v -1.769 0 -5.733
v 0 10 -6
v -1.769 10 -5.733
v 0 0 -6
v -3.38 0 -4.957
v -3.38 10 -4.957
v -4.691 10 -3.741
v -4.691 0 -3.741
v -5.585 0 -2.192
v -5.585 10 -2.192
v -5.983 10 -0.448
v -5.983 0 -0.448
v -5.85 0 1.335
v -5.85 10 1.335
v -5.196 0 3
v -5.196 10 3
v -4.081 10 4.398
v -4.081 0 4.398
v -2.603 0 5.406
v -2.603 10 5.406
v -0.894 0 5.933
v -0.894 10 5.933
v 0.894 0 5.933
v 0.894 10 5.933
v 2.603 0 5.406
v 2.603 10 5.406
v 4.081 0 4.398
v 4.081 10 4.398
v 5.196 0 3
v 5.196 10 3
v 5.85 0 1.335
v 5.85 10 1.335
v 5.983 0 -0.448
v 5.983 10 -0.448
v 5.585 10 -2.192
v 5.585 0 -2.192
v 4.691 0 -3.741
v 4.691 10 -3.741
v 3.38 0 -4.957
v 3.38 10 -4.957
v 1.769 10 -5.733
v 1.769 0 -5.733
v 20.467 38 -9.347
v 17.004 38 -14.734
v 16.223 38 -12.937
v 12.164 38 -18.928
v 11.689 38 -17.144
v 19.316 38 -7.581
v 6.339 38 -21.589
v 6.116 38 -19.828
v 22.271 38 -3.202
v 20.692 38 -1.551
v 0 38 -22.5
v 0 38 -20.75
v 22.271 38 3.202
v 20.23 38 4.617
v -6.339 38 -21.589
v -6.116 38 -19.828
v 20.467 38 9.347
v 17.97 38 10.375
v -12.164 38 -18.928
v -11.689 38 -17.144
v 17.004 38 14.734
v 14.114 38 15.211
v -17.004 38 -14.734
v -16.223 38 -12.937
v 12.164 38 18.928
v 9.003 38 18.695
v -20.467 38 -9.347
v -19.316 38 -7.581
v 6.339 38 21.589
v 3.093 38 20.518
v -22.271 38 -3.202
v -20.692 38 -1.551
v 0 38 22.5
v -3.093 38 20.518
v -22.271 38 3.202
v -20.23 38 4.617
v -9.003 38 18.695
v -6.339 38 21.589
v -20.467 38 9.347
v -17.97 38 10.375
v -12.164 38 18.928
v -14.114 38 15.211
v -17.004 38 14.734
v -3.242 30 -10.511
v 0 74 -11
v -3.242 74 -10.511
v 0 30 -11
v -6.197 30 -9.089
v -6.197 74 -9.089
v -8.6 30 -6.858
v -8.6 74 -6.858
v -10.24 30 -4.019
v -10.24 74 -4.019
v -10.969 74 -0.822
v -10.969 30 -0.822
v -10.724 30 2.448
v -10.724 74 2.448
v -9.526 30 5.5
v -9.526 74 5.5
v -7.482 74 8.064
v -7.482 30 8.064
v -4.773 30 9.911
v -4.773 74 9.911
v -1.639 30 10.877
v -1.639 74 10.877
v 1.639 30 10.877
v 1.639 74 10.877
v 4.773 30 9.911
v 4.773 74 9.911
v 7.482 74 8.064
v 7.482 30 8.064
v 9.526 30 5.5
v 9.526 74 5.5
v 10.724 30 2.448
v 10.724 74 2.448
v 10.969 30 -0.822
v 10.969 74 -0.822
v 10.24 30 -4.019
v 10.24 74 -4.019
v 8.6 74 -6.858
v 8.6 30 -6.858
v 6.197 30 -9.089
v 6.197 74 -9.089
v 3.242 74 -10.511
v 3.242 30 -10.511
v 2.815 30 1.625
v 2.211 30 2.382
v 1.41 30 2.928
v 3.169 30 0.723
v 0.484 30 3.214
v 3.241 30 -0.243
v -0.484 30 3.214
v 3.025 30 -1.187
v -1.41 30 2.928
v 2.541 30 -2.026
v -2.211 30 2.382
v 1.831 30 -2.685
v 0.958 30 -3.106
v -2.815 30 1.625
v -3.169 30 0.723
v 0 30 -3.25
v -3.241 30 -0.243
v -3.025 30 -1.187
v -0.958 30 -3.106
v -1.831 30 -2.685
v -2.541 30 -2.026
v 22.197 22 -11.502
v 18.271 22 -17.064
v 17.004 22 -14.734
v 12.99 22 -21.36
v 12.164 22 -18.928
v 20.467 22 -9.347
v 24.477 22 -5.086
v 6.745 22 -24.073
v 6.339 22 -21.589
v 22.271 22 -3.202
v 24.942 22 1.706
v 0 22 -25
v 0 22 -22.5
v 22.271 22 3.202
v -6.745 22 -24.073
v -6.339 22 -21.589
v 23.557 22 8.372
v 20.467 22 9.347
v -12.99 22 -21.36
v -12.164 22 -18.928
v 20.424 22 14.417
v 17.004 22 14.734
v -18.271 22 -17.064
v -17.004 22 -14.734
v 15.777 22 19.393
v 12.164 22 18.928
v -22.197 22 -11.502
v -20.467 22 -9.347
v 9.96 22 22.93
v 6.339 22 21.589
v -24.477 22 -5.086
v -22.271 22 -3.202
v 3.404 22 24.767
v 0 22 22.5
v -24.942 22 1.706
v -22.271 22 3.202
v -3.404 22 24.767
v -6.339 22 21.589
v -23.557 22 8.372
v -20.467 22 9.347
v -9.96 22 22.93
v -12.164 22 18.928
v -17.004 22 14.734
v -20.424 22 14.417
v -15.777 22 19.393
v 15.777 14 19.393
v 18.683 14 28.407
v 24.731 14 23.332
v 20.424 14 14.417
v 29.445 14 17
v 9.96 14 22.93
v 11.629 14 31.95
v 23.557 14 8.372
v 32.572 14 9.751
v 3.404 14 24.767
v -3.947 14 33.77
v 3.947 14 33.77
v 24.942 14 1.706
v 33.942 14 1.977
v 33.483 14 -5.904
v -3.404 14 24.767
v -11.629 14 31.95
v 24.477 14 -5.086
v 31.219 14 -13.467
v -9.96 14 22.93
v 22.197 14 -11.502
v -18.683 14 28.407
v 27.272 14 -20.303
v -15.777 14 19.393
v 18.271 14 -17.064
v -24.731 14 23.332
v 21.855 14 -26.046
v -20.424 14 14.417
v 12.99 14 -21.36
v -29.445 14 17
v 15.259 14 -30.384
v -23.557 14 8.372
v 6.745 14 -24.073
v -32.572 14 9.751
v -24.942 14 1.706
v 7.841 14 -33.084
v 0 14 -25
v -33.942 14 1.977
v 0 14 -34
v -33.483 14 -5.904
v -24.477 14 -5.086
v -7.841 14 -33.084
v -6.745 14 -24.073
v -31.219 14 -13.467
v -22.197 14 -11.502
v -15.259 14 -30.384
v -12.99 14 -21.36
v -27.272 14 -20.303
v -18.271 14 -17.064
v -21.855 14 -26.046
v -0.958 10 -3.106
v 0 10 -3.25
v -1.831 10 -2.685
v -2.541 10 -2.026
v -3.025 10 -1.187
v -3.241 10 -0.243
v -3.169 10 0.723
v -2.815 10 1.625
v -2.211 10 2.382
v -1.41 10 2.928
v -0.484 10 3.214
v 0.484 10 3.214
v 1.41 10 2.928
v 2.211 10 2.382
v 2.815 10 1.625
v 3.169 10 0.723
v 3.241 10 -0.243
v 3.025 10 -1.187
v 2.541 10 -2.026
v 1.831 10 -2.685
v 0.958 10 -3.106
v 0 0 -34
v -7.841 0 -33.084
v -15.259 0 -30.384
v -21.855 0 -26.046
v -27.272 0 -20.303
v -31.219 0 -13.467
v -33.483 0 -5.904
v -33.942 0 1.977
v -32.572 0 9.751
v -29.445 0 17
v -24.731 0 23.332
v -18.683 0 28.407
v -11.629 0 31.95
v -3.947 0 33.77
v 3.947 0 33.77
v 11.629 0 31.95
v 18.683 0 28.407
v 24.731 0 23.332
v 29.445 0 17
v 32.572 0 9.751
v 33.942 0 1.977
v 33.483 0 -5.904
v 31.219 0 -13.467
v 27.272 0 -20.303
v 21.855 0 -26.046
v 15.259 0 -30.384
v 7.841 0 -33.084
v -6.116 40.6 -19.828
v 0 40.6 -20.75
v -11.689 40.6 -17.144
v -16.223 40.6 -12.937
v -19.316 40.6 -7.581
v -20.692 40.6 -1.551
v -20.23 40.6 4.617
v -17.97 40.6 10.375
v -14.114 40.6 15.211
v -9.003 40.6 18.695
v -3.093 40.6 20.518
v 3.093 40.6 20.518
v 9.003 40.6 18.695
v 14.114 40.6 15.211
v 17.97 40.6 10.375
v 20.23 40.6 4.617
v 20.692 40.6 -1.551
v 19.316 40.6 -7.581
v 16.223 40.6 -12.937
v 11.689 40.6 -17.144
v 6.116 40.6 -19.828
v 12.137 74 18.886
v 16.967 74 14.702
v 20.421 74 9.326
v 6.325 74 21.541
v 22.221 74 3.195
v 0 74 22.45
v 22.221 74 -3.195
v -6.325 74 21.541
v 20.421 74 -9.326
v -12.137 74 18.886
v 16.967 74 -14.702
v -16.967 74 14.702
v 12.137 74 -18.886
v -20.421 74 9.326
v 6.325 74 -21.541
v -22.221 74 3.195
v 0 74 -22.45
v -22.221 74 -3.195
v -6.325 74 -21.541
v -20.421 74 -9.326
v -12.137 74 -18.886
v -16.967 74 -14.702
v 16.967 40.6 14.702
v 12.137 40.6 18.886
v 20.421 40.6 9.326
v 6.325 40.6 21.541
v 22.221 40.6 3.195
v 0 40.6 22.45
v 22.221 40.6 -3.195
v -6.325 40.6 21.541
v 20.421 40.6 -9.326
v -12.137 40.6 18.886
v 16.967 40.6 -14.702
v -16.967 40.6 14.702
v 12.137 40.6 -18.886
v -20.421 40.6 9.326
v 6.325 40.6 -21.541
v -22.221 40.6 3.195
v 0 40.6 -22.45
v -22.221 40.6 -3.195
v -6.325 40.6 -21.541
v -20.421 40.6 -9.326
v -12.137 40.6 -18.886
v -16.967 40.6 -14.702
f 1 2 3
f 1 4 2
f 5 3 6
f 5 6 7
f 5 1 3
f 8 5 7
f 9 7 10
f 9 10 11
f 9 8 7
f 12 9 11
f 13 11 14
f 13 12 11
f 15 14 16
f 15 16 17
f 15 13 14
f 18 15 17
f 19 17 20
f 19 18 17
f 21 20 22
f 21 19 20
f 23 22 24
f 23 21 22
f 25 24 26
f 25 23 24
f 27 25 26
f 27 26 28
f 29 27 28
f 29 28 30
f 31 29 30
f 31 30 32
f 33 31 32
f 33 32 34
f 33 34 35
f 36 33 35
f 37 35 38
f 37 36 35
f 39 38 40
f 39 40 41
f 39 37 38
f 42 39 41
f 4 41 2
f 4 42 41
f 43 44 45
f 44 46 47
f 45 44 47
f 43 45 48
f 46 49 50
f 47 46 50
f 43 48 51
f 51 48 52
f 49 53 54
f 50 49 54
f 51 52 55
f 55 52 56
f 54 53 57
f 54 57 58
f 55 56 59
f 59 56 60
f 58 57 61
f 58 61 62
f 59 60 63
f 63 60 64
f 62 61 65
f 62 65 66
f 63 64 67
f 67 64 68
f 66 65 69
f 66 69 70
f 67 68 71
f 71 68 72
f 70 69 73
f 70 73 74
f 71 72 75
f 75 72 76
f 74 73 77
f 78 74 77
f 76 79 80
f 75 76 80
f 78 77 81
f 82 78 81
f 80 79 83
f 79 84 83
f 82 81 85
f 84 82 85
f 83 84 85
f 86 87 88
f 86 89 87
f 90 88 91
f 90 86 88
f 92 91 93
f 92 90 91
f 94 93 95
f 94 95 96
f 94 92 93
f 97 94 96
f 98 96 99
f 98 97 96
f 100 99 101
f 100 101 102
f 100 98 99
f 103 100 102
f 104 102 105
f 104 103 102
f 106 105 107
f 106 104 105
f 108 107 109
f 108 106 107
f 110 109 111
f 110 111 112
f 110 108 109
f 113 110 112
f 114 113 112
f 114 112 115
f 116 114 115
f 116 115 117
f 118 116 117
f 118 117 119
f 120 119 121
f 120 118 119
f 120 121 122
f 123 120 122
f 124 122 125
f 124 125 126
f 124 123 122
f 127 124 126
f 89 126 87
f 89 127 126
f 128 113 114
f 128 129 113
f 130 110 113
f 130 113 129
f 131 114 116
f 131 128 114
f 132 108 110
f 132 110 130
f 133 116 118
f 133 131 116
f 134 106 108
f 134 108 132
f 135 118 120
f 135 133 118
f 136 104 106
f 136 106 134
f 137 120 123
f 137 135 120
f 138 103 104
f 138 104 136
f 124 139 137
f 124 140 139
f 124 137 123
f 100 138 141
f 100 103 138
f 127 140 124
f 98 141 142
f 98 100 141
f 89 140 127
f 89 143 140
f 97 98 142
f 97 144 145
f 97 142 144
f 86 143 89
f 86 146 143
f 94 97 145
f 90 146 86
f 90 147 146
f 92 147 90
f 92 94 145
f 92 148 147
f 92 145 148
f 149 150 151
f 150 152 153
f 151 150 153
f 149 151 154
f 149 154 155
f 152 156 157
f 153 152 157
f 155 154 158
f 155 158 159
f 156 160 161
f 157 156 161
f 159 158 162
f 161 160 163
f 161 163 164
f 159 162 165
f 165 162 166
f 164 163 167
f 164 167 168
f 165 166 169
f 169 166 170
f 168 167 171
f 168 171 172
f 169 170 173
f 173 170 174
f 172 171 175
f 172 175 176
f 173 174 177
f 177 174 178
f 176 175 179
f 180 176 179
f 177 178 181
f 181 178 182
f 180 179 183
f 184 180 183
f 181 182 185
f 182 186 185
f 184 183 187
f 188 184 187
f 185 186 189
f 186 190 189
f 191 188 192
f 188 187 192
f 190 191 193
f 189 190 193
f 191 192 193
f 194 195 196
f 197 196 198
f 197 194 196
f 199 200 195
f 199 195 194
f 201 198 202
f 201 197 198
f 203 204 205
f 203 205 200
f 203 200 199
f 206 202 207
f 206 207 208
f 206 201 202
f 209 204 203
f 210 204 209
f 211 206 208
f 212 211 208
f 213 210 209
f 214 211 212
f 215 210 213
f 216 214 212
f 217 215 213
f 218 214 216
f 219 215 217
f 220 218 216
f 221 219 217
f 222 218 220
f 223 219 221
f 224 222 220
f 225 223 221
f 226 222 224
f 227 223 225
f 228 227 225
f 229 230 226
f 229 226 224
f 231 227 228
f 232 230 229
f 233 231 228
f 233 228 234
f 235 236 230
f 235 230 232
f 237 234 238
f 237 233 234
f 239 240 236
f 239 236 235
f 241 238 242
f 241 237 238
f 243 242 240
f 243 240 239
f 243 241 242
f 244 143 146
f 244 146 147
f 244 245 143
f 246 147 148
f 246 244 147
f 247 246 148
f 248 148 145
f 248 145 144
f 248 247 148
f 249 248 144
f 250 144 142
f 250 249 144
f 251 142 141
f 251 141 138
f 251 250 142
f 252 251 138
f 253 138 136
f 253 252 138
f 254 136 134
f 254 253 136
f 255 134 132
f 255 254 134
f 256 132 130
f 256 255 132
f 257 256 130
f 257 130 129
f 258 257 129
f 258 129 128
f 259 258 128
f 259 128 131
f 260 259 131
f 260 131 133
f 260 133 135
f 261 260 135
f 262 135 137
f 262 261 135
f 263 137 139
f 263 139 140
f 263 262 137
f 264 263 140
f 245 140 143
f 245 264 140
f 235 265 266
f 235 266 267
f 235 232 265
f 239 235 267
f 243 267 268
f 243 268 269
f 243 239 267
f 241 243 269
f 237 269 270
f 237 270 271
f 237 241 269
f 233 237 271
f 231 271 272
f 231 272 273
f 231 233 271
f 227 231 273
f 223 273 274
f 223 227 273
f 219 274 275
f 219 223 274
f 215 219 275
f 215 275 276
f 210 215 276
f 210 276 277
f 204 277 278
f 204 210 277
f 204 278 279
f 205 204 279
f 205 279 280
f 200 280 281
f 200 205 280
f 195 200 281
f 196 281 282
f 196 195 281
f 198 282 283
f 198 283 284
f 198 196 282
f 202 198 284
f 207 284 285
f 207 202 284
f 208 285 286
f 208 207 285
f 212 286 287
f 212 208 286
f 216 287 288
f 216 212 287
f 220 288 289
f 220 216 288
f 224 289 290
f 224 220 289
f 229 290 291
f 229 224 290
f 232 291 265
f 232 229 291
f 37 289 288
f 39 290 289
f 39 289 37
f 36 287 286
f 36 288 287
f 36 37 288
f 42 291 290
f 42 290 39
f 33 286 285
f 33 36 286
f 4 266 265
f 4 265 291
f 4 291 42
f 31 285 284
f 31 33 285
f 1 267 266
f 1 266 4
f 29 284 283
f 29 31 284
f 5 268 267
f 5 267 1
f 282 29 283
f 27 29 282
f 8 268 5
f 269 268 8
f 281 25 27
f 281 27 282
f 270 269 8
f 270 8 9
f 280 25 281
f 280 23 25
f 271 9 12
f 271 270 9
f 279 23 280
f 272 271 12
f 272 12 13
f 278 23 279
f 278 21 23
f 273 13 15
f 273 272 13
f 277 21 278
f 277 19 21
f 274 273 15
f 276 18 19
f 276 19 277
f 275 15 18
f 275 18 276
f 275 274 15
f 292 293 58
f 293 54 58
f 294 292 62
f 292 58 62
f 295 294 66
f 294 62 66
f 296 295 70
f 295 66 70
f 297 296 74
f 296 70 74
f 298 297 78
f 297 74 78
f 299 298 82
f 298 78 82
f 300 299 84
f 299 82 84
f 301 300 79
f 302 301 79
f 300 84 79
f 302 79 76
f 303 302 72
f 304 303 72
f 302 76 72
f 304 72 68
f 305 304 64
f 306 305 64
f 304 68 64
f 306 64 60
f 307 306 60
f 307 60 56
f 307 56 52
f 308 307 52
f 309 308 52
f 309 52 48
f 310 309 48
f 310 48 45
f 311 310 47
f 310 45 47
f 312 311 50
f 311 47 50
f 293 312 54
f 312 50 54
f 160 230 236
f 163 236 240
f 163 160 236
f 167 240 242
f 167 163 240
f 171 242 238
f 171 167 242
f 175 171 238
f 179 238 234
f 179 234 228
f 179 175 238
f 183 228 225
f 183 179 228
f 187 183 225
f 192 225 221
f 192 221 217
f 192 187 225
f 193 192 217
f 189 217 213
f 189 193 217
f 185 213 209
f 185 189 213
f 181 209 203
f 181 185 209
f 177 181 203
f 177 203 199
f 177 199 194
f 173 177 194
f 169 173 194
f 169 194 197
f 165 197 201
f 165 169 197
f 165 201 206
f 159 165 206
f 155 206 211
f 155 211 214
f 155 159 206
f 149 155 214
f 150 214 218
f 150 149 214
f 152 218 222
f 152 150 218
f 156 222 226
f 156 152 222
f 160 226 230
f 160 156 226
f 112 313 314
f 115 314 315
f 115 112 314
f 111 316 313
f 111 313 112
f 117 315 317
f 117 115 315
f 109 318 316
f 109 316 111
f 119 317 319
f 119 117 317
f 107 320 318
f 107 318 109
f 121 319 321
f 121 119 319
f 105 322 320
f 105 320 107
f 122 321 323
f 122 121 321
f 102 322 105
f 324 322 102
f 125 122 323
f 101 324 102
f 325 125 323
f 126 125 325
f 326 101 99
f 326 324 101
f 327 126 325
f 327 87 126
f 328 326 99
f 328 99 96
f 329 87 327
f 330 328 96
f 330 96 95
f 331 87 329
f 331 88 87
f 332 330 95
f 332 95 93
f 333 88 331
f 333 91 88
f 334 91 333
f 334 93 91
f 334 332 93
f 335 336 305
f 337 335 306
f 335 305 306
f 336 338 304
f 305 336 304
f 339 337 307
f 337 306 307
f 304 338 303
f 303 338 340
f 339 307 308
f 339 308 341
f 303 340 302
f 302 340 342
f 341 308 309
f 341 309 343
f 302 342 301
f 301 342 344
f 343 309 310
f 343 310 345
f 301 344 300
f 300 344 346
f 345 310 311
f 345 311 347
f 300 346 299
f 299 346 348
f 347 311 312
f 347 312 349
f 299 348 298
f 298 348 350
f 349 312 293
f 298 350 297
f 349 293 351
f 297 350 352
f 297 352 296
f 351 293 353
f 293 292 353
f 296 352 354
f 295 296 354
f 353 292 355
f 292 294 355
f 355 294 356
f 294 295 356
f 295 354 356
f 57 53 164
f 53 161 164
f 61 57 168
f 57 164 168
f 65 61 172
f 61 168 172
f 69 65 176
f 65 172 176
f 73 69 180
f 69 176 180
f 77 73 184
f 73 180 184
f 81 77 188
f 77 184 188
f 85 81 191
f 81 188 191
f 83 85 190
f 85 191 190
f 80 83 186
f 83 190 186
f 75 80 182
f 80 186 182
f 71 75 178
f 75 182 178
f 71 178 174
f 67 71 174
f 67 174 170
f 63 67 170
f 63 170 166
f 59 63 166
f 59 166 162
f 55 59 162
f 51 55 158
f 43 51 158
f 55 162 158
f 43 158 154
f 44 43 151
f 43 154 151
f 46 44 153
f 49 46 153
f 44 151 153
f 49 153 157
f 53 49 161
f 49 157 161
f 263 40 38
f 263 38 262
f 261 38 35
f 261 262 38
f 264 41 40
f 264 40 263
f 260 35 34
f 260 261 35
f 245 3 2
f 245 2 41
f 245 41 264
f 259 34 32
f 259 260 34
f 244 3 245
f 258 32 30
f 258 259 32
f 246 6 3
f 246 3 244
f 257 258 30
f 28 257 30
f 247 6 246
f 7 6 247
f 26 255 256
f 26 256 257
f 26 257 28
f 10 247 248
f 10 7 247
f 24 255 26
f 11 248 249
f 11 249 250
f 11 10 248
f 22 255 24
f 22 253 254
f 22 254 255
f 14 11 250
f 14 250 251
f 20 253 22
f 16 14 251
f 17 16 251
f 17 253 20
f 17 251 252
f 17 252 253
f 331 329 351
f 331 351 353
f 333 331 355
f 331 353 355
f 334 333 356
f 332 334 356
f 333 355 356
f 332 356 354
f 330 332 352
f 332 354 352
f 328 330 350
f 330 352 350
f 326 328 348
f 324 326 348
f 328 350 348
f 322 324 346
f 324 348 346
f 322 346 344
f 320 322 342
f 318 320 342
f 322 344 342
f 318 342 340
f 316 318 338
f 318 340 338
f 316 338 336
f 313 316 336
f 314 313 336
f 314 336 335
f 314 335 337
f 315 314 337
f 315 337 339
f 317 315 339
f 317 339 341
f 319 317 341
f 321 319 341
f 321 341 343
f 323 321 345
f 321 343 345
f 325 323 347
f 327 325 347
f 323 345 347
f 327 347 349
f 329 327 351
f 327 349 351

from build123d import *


with BuildPart() as part:
    # Sketch1 → Revolve1 (revolve)
    with BuildSketch(Plane.XY, mode=Mode.PRIVATE) as revolve1_sk:
        Polygon((-6, 0), (-34, 0), (-34, 14), (-25, 14), (-25, 74), (-11, 74), (-11, 30), (-3.25, 30), (-3.25, 10), (-6, 10), align=None)
    revolve(revolve1_sk.sketch.rotate(Axis((0, 0, 0), (0, 1, 0)), 270), axis=Axis((0, 0, 0), (0, 1, 0)))

    # Sketch3 → Cut-Revolve1 (revolve, cut)
    with BuildSketch(Plane.XY, mode=Mode.PRIVATE) as cut_revolve1_sk:
        Polygon((22.45, 74), (22.45, 40.6), (20.75, 40.6), (20.75, 38), (22.5, 38), (22.5, 22), (25, 22), (25, 74), align=None)
    revolve(cut_revolve1_sk.sketch.rotate(Axis((0, 0, 0), (0, 1, 0)), 90), axis=Axis((0, 0, 0), (0, 1, 0)), mode=Mode.SUBTRACT)


solid = part.part
